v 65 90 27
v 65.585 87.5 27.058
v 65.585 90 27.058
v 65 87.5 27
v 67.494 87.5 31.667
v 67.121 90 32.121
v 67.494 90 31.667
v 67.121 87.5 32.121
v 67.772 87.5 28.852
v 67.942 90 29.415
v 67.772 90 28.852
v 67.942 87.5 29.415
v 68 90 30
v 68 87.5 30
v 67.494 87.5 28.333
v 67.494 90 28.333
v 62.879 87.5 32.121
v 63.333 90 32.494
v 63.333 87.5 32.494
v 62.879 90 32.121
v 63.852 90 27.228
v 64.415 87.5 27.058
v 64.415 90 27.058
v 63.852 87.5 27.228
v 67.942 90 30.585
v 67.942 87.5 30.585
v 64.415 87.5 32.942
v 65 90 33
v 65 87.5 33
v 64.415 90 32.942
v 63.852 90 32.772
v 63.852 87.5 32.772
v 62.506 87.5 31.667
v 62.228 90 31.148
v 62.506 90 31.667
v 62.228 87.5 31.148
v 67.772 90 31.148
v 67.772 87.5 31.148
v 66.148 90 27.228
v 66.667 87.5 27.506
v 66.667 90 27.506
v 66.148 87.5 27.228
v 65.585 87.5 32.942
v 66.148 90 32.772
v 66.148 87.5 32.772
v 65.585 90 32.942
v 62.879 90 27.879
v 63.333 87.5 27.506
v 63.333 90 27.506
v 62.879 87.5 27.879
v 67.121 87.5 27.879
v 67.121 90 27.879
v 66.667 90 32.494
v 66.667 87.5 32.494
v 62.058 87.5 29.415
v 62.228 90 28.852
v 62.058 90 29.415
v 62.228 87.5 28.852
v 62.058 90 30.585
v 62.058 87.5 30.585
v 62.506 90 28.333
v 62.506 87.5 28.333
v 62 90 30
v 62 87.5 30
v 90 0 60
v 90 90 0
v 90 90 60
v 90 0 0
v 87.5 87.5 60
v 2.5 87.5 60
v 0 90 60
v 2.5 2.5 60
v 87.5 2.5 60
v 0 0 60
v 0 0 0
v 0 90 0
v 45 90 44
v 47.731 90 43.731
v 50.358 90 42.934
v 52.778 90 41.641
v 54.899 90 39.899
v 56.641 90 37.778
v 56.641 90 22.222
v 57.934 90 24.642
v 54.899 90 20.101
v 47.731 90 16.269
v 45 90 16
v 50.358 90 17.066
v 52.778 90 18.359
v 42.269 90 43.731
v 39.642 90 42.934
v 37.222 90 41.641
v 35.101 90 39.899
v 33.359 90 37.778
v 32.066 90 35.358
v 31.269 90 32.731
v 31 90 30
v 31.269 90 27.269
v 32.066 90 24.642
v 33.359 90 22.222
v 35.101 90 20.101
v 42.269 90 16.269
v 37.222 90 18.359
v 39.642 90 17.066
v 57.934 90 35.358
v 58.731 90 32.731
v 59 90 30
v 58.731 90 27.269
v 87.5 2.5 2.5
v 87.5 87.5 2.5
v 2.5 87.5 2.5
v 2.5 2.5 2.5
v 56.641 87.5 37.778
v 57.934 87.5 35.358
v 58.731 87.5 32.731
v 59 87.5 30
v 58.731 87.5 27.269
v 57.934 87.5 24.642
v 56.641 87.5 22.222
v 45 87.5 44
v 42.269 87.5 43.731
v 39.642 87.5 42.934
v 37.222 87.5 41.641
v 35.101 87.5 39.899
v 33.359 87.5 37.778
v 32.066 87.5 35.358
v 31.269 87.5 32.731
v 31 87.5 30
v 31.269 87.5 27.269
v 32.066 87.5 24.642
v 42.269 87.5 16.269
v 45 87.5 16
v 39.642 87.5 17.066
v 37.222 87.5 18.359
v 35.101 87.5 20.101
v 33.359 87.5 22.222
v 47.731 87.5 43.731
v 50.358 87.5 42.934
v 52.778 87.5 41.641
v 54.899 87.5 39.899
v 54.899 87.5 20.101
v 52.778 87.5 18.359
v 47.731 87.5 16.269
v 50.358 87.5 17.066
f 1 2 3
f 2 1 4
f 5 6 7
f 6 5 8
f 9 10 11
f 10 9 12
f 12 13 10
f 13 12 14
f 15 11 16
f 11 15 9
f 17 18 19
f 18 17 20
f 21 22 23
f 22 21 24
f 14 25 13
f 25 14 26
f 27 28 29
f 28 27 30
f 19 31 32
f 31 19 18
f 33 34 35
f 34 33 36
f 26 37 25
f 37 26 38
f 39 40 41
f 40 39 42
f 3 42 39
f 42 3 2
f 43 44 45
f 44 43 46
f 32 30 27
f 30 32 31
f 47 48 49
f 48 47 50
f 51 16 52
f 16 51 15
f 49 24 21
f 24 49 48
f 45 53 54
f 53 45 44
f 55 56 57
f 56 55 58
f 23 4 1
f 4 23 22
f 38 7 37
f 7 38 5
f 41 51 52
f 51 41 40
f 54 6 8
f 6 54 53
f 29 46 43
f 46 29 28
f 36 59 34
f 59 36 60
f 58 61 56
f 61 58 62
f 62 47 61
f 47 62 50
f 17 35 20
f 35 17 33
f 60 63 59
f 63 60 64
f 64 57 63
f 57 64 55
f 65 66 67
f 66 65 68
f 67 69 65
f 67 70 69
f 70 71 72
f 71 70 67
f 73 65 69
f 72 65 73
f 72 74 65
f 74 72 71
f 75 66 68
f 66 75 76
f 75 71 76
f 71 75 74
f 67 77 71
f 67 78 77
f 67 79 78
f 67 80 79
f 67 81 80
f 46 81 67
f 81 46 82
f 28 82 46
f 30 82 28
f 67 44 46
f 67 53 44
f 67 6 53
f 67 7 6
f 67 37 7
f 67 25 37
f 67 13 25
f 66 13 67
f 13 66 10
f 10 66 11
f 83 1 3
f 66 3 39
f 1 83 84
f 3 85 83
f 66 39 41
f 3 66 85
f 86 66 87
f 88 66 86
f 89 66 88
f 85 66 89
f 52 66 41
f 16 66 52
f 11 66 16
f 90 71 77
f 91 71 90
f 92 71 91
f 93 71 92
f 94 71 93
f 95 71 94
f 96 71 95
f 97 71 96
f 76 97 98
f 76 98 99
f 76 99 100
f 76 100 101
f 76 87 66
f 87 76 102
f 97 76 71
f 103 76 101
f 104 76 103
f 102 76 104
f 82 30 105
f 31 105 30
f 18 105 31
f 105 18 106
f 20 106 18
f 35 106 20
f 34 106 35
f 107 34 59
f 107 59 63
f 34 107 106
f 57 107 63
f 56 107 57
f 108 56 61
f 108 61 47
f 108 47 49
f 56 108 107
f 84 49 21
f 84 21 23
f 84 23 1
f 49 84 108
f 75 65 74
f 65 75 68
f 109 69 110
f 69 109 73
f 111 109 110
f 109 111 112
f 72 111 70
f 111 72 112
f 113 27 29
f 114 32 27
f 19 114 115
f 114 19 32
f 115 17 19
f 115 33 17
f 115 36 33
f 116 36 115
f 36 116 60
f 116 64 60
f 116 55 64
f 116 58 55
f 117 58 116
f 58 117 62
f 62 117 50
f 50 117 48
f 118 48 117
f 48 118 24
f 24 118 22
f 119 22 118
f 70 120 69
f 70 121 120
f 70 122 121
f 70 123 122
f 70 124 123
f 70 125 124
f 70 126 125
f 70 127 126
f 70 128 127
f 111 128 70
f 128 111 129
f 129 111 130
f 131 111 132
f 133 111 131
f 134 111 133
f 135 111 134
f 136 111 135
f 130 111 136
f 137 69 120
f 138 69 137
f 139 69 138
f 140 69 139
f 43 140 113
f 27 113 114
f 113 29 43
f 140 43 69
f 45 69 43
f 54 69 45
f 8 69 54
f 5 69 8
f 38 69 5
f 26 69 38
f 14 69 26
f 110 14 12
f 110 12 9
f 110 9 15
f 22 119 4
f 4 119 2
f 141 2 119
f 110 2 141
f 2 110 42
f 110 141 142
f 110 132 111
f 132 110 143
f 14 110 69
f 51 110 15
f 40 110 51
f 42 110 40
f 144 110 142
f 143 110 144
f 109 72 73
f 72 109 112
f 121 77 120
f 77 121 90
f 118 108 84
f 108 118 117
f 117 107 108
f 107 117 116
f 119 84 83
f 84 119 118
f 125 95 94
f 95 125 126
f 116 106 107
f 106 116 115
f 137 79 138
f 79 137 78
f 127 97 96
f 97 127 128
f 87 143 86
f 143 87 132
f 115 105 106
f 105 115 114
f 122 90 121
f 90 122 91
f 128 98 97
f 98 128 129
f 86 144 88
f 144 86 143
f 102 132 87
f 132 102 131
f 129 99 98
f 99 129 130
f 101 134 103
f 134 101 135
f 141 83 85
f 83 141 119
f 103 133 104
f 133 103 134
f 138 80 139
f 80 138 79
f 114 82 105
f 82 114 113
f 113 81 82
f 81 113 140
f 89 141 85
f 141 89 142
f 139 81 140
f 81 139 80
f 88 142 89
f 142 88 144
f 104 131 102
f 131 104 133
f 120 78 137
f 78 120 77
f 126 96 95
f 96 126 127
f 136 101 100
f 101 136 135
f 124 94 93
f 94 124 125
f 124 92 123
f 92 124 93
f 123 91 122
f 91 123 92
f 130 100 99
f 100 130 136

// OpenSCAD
$fn = 32;

// ----------------------------------------------------------------------
// Vent box: roundvent enclosure
// ----------------------------------------------------------------------

// --- parameters (mm) ---
box_l = 90;               // box length, X
box_w = 90;               // box width, Y
box_h = 60;               // box height, Z
wall_t = 2.5;             // shell wall thickness
vent_d = 28;              // central vent diameter
ring_d = 6;               // ring hole diameter
n_ring = 8;               // holes in the ring
ring_r = 20;              // ring radius
fit_tol = 0.1;            // tolerance for press fits, mm
free_tol = 0.5;           // tolerance for clearance fits, mm

ring_step = 360 / n_ring;  // ring hole angular step

difference() {
  cube([box_l, box_w, box_h]);
  translate([wall_t, wall_t, wall_t])
    cube([box_l - 2 * wall_t, box_w - 2 * wall_t, box_h]);
  translate([box_l / 2, box_w - wall_t - 1, box_h / 2])
    rotate([-90, 0, 0]) cylinder(h = wall_t + 2, d = vent_d);
  for (i = [0 : n_ring - 1])
    translate([box_l / 2, box_w - wall_t - 1, box_h / 2])
      rotate([0, 0, i * ring_step])
        translate([ring_r, 0, 0]) rotate([-90, 0, 0])
          cylinder(h = wall_t + 2, d = ring_d);
}
